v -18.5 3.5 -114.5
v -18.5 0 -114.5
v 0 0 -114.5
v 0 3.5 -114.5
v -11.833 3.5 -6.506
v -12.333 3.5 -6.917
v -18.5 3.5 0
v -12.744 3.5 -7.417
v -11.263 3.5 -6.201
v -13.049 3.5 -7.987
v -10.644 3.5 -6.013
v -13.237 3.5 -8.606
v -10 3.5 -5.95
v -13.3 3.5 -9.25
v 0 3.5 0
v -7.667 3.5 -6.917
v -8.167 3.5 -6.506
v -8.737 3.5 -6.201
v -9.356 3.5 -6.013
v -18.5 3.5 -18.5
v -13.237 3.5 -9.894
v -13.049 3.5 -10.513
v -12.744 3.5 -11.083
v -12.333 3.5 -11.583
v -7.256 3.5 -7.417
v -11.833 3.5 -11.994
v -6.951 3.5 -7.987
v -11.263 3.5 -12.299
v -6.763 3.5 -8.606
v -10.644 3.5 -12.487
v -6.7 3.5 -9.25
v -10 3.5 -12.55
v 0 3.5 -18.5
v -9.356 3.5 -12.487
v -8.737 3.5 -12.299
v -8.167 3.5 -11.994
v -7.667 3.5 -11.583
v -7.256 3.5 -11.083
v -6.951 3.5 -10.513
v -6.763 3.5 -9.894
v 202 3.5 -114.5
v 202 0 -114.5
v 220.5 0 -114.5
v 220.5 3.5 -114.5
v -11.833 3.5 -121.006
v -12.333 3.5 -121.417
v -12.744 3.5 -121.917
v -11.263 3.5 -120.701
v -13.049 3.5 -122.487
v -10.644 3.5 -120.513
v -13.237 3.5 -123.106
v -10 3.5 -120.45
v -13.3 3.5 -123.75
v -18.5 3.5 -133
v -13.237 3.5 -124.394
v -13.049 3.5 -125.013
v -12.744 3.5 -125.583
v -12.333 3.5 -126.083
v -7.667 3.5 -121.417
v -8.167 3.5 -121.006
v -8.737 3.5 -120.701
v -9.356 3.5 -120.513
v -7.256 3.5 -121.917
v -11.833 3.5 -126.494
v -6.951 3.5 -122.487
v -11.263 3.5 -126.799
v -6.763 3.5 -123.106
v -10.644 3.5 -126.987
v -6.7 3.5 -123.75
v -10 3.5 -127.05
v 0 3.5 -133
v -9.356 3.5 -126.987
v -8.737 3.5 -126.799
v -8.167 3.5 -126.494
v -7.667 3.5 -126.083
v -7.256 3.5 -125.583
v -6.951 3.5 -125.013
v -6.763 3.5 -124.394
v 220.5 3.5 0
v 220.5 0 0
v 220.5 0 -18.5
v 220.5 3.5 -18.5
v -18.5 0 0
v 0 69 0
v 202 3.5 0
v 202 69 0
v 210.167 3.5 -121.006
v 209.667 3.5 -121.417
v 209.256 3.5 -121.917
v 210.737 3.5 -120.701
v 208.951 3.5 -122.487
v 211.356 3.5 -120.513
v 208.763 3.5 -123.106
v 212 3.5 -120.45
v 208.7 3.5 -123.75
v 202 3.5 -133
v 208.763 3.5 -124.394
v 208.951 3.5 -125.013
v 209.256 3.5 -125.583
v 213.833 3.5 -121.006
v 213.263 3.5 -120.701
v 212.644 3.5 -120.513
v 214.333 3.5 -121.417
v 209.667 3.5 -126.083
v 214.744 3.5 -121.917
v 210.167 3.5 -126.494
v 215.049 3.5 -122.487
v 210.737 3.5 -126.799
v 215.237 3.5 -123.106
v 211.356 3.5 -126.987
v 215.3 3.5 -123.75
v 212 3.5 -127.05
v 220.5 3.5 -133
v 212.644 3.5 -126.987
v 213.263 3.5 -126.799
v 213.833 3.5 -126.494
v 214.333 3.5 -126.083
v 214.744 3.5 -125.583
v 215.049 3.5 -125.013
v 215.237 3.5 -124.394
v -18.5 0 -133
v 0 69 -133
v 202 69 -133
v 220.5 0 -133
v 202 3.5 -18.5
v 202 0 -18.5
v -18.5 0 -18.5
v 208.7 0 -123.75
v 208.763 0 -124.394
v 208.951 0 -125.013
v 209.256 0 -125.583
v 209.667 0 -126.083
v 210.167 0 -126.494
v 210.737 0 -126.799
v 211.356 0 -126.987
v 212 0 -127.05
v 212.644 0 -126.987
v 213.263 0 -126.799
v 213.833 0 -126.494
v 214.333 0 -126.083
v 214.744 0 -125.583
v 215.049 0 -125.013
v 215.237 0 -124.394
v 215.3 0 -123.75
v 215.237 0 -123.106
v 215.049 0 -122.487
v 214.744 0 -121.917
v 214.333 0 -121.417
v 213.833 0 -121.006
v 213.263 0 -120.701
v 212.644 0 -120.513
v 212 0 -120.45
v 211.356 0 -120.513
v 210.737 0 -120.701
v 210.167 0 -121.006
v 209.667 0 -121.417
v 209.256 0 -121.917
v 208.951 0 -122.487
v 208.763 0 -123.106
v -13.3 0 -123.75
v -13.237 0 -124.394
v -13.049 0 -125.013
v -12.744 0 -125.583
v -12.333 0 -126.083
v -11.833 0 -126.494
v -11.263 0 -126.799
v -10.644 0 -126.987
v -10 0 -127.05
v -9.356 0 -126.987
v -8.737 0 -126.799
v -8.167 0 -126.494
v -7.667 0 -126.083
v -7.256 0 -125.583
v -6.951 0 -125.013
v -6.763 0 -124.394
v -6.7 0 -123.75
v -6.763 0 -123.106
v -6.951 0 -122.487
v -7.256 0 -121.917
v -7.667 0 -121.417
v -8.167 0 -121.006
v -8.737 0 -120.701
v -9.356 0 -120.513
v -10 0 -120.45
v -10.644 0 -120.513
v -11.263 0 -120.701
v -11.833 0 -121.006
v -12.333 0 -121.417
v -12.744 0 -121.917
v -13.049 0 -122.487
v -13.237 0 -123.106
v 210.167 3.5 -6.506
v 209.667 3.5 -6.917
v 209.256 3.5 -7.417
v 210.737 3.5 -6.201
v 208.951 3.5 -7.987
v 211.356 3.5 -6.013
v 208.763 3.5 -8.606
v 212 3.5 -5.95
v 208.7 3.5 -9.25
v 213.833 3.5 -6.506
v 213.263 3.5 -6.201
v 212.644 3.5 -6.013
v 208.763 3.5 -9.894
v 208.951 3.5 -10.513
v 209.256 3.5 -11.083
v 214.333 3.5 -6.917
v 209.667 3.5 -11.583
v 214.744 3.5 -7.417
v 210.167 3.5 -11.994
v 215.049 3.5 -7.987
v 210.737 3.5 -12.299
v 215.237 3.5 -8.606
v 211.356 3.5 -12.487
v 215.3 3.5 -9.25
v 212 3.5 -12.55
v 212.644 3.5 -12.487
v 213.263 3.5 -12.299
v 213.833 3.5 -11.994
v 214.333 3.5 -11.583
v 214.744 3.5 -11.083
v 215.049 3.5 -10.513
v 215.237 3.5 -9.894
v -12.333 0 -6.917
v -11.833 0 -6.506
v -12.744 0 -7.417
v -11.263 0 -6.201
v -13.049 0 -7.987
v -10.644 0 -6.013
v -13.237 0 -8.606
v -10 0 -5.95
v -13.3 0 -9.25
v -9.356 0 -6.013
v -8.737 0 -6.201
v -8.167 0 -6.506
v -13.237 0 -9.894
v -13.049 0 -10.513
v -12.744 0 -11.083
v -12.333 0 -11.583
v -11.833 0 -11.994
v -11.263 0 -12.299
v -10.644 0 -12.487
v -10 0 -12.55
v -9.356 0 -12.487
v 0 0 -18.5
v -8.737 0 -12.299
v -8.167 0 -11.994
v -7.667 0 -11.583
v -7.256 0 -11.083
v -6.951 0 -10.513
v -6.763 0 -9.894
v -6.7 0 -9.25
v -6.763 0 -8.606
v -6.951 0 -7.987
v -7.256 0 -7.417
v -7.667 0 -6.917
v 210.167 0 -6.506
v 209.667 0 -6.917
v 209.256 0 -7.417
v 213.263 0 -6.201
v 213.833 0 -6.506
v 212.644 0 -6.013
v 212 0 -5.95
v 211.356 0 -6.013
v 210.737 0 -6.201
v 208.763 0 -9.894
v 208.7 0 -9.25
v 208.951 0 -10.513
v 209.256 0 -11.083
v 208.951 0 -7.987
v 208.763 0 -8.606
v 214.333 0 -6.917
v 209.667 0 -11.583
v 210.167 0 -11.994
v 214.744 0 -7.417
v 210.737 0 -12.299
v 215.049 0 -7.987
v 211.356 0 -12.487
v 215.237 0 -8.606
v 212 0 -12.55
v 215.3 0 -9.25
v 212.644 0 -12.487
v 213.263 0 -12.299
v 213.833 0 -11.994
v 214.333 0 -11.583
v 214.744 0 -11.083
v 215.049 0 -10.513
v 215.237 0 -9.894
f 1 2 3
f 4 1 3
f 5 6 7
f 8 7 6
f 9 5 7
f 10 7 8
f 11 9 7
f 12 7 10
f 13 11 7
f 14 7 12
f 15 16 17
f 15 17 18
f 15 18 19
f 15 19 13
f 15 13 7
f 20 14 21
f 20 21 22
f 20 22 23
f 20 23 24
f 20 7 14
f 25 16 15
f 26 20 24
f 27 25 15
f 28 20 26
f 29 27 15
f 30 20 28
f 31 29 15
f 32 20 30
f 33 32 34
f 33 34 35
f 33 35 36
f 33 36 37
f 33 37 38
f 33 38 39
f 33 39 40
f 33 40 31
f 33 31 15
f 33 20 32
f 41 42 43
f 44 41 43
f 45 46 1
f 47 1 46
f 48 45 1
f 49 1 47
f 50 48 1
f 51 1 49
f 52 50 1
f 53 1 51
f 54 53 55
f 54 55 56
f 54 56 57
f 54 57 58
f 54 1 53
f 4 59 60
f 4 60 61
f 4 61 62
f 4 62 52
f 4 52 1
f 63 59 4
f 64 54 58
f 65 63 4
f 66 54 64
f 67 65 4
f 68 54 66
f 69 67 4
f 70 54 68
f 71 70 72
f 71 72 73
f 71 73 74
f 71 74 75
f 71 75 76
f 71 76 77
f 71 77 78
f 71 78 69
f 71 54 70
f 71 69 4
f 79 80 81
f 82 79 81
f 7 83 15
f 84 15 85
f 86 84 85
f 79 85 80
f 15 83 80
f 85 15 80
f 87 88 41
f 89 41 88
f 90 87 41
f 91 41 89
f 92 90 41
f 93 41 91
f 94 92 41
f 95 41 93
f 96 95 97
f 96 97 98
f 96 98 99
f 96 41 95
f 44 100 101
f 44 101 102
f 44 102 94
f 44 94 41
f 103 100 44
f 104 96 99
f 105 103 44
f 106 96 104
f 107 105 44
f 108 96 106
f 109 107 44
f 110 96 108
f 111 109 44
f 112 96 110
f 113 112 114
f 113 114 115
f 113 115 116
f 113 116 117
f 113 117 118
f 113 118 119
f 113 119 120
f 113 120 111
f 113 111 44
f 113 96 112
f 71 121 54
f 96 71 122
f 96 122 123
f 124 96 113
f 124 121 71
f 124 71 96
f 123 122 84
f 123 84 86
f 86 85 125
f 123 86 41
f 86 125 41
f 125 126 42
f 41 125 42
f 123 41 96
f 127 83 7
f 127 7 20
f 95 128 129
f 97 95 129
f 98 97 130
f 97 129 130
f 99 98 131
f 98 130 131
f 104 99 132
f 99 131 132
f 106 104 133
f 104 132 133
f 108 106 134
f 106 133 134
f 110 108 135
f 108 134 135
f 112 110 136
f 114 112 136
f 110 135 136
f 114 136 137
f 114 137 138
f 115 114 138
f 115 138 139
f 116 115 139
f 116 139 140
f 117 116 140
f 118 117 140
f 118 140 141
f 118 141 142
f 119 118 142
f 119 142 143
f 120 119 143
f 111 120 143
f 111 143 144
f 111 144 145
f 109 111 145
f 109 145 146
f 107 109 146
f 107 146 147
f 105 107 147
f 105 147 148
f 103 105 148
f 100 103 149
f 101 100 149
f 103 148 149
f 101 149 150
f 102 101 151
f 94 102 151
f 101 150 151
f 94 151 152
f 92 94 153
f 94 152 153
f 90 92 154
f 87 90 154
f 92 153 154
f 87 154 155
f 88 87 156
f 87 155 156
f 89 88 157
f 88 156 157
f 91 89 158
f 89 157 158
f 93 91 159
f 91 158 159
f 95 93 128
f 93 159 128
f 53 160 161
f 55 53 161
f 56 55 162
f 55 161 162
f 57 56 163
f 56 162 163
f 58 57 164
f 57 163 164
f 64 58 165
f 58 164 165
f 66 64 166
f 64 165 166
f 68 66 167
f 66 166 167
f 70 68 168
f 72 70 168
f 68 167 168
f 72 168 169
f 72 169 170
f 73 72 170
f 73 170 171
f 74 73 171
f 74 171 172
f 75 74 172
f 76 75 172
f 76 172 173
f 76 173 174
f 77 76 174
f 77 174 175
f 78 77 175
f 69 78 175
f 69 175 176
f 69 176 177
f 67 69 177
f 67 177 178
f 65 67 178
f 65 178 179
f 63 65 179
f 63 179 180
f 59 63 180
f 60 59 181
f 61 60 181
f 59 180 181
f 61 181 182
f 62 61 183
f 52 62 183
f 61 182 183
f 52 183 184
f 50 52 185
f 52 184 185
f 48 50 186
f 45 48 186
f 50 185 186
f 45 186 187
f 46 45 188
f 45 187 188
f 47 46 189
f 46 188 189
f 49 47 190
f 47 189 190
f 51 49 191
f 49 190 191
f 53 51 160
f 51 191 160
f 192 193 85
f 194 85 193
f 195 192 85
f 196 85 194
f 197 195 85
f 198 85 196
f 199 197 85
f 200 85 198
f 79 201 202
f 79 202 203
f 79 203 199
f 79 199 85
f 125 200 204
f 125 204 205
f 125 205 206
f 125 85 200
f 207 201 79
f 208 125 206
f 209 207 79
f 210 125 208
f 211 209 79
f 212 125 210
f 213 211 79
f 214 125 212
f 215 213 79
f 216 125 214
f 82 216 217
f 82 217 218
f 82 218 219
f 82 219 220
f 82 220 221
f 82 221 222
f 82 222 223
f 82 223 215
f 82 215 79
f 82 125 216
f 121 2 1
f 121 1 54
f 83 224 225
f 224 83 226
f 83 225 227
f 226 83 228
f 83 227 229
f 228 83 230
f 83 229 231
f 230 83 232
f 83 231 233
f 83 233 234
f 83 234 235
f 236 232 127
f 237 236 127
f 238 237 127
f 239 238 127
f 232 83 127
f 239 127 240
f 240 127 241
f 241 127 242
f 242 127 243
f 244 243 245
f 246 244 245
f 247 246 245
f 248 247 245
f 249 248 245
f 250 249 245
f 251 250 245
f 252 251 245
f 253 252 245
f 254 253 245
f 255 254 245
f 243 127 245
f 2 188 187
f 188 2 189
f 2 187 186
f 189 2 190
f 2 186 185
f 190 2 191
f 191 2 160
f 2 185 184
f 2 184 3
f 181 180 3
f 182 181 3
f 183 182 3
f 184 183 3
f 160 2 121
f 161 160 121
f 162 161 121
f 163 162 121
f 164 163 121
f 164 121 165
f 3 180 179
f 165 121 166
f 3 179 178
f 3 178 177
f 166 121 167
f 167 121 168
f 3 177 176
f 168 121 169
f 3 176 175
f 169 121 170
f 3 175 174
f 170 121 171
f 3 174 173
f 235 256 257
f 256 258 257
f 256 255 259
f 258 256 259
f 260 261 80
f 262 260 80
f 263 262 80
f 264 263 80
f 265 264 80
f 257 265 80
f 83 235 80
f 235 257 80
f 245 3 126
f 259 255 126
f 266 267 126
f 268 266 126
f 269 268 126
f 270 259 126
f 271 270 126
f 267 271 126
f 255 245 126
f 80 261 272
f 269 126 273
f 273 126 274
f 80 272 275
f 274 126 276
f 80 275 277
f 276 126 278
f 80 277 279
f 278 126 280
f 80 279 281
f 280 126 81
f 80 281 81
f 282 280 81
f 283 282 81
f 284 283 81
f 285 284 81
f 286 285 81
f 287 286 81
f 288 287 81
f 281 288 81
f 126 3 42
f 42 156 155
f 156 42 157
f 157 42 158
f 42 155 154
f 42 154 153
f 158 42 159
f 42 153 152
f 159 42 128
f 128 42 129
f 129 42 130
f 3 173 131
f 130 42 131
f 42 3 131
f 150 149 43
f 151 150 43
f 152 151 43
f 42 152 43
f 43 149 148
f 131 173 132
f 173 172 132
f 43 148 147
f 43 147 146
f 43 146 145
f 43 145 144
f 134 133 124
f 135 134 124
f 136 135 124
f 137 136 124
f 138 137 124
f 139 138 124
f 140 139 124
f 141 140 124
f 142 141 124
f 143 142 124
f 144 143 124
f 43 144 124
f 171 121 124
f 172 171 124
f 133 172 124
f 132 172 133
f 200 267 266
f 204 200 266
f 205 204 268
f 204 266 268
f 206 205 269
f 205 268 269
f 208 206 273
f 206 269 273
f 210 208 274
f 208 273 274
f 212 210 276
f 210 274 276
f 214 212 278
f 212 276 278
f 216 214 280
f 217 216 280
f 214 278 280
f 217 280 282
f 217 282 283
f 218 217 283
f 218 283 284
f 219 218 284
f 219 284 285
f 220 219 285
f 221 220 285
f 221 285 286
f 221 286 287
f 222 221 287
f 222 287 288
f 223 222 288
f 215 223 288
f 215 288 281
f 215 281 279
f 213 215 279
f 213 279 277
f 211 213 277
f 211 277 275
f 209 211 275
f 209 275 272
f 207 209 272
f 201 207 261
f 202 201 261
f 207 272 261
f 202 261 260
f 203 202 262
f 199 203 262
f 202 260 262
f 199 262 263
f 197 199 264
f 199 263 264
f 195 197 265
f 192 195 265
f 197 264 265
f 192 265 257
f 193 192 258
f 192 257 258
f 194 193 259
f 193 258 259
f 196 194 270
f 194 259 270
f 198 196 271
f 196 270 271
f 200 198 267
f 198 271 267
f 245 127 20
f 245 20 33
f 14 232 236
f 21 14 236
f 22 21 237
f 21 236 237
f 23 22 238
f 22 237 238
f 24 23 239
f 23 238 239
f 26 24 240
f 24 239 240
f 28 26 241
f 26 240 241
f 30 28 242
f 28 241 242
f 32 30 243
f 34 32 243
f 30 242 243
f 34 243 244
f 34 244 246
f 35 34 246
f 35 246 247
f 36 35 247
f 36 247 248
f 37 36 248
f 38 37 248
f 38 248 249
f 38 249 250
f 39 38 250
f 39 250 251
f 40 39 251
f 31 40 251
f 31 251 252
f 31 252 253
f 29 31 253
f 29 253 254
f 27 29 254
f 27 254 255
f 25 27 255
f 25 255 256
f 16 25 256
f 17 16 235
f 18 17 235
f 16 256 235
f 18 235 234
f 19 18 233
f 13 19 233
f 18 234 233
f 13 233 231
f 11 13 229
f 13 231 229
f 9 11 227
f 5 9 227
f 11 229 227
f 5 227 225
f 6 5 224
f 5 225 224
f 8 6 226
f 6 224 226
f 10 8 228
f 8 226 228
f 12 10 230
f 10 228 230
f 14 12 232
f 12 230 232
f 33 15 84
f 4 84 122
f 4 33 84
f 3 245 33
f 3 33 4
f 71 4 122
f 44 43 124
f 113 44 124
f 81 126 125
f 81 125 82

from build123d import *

# Parameters (mm, degrees)
SKETCH1_W            = 202
SKETCH1_H            = 133
BOSS_EXTRUDE1_DEPTH  = 69
SKETCH2_W            = 18.5
SKETCH2_H            = 18.5
BOSS_EXTRUDE2_DEPTH  = 3.5
M6_CLEARANCE_HOLE1_D = 6.6


with BuildPart() as part:
    # Sketch1 → Boss-Extrude1 (new body)
    with BuildSketch(Plane(origin=(0, 0, 0), x_dir=(1, 0, 0), z_dir=(0, 1, 0))):
        with Locations((101, 66.5)):
            Rectangle(SKETCH1_W, SKETCH1_H)
    extrude(amount=BOSS_EXTRUDE1_DEPTH)

    # Sketch2 → Boss-Extrude2 (add)
    with BuildSketch(Plane(origin=(0, 0, 0), x_dir=(1, 0, 0), z_dir=(0, 1, 0))):
        with Locations((-9.25, 123.75)):
            Rectangle(SKETCH2_W, SKETCH2_H)
        with Locations((-9.25, 9.25)):
            Rectangle(SKETCH2_W, SKETCH2_H)
        with Locations((211.25, 9.25)):
            Rectangle(SKETCH2_W, SKETCH2_H)
        with Locations((211.25, 123.75)):
            Rectangle(SKETCH2_W, SKETCH2_H)
    extrude(amount=BOSS_EXTRUDE2_DEPTH)

    # M6 Clearance Hole1 (through all)
    with Locations(Plane(origin=(0, 3.5, 0), x_dir=(1, 0, 0), z_dir=(0, 1, 0))):
        with Locations((-10, 123.75), (-10, 9.25), (212, 9.25), (212, 123.75)):
            Hole(M6_CLEARANCE_HOLE1_D / 2)


solid = part.part
